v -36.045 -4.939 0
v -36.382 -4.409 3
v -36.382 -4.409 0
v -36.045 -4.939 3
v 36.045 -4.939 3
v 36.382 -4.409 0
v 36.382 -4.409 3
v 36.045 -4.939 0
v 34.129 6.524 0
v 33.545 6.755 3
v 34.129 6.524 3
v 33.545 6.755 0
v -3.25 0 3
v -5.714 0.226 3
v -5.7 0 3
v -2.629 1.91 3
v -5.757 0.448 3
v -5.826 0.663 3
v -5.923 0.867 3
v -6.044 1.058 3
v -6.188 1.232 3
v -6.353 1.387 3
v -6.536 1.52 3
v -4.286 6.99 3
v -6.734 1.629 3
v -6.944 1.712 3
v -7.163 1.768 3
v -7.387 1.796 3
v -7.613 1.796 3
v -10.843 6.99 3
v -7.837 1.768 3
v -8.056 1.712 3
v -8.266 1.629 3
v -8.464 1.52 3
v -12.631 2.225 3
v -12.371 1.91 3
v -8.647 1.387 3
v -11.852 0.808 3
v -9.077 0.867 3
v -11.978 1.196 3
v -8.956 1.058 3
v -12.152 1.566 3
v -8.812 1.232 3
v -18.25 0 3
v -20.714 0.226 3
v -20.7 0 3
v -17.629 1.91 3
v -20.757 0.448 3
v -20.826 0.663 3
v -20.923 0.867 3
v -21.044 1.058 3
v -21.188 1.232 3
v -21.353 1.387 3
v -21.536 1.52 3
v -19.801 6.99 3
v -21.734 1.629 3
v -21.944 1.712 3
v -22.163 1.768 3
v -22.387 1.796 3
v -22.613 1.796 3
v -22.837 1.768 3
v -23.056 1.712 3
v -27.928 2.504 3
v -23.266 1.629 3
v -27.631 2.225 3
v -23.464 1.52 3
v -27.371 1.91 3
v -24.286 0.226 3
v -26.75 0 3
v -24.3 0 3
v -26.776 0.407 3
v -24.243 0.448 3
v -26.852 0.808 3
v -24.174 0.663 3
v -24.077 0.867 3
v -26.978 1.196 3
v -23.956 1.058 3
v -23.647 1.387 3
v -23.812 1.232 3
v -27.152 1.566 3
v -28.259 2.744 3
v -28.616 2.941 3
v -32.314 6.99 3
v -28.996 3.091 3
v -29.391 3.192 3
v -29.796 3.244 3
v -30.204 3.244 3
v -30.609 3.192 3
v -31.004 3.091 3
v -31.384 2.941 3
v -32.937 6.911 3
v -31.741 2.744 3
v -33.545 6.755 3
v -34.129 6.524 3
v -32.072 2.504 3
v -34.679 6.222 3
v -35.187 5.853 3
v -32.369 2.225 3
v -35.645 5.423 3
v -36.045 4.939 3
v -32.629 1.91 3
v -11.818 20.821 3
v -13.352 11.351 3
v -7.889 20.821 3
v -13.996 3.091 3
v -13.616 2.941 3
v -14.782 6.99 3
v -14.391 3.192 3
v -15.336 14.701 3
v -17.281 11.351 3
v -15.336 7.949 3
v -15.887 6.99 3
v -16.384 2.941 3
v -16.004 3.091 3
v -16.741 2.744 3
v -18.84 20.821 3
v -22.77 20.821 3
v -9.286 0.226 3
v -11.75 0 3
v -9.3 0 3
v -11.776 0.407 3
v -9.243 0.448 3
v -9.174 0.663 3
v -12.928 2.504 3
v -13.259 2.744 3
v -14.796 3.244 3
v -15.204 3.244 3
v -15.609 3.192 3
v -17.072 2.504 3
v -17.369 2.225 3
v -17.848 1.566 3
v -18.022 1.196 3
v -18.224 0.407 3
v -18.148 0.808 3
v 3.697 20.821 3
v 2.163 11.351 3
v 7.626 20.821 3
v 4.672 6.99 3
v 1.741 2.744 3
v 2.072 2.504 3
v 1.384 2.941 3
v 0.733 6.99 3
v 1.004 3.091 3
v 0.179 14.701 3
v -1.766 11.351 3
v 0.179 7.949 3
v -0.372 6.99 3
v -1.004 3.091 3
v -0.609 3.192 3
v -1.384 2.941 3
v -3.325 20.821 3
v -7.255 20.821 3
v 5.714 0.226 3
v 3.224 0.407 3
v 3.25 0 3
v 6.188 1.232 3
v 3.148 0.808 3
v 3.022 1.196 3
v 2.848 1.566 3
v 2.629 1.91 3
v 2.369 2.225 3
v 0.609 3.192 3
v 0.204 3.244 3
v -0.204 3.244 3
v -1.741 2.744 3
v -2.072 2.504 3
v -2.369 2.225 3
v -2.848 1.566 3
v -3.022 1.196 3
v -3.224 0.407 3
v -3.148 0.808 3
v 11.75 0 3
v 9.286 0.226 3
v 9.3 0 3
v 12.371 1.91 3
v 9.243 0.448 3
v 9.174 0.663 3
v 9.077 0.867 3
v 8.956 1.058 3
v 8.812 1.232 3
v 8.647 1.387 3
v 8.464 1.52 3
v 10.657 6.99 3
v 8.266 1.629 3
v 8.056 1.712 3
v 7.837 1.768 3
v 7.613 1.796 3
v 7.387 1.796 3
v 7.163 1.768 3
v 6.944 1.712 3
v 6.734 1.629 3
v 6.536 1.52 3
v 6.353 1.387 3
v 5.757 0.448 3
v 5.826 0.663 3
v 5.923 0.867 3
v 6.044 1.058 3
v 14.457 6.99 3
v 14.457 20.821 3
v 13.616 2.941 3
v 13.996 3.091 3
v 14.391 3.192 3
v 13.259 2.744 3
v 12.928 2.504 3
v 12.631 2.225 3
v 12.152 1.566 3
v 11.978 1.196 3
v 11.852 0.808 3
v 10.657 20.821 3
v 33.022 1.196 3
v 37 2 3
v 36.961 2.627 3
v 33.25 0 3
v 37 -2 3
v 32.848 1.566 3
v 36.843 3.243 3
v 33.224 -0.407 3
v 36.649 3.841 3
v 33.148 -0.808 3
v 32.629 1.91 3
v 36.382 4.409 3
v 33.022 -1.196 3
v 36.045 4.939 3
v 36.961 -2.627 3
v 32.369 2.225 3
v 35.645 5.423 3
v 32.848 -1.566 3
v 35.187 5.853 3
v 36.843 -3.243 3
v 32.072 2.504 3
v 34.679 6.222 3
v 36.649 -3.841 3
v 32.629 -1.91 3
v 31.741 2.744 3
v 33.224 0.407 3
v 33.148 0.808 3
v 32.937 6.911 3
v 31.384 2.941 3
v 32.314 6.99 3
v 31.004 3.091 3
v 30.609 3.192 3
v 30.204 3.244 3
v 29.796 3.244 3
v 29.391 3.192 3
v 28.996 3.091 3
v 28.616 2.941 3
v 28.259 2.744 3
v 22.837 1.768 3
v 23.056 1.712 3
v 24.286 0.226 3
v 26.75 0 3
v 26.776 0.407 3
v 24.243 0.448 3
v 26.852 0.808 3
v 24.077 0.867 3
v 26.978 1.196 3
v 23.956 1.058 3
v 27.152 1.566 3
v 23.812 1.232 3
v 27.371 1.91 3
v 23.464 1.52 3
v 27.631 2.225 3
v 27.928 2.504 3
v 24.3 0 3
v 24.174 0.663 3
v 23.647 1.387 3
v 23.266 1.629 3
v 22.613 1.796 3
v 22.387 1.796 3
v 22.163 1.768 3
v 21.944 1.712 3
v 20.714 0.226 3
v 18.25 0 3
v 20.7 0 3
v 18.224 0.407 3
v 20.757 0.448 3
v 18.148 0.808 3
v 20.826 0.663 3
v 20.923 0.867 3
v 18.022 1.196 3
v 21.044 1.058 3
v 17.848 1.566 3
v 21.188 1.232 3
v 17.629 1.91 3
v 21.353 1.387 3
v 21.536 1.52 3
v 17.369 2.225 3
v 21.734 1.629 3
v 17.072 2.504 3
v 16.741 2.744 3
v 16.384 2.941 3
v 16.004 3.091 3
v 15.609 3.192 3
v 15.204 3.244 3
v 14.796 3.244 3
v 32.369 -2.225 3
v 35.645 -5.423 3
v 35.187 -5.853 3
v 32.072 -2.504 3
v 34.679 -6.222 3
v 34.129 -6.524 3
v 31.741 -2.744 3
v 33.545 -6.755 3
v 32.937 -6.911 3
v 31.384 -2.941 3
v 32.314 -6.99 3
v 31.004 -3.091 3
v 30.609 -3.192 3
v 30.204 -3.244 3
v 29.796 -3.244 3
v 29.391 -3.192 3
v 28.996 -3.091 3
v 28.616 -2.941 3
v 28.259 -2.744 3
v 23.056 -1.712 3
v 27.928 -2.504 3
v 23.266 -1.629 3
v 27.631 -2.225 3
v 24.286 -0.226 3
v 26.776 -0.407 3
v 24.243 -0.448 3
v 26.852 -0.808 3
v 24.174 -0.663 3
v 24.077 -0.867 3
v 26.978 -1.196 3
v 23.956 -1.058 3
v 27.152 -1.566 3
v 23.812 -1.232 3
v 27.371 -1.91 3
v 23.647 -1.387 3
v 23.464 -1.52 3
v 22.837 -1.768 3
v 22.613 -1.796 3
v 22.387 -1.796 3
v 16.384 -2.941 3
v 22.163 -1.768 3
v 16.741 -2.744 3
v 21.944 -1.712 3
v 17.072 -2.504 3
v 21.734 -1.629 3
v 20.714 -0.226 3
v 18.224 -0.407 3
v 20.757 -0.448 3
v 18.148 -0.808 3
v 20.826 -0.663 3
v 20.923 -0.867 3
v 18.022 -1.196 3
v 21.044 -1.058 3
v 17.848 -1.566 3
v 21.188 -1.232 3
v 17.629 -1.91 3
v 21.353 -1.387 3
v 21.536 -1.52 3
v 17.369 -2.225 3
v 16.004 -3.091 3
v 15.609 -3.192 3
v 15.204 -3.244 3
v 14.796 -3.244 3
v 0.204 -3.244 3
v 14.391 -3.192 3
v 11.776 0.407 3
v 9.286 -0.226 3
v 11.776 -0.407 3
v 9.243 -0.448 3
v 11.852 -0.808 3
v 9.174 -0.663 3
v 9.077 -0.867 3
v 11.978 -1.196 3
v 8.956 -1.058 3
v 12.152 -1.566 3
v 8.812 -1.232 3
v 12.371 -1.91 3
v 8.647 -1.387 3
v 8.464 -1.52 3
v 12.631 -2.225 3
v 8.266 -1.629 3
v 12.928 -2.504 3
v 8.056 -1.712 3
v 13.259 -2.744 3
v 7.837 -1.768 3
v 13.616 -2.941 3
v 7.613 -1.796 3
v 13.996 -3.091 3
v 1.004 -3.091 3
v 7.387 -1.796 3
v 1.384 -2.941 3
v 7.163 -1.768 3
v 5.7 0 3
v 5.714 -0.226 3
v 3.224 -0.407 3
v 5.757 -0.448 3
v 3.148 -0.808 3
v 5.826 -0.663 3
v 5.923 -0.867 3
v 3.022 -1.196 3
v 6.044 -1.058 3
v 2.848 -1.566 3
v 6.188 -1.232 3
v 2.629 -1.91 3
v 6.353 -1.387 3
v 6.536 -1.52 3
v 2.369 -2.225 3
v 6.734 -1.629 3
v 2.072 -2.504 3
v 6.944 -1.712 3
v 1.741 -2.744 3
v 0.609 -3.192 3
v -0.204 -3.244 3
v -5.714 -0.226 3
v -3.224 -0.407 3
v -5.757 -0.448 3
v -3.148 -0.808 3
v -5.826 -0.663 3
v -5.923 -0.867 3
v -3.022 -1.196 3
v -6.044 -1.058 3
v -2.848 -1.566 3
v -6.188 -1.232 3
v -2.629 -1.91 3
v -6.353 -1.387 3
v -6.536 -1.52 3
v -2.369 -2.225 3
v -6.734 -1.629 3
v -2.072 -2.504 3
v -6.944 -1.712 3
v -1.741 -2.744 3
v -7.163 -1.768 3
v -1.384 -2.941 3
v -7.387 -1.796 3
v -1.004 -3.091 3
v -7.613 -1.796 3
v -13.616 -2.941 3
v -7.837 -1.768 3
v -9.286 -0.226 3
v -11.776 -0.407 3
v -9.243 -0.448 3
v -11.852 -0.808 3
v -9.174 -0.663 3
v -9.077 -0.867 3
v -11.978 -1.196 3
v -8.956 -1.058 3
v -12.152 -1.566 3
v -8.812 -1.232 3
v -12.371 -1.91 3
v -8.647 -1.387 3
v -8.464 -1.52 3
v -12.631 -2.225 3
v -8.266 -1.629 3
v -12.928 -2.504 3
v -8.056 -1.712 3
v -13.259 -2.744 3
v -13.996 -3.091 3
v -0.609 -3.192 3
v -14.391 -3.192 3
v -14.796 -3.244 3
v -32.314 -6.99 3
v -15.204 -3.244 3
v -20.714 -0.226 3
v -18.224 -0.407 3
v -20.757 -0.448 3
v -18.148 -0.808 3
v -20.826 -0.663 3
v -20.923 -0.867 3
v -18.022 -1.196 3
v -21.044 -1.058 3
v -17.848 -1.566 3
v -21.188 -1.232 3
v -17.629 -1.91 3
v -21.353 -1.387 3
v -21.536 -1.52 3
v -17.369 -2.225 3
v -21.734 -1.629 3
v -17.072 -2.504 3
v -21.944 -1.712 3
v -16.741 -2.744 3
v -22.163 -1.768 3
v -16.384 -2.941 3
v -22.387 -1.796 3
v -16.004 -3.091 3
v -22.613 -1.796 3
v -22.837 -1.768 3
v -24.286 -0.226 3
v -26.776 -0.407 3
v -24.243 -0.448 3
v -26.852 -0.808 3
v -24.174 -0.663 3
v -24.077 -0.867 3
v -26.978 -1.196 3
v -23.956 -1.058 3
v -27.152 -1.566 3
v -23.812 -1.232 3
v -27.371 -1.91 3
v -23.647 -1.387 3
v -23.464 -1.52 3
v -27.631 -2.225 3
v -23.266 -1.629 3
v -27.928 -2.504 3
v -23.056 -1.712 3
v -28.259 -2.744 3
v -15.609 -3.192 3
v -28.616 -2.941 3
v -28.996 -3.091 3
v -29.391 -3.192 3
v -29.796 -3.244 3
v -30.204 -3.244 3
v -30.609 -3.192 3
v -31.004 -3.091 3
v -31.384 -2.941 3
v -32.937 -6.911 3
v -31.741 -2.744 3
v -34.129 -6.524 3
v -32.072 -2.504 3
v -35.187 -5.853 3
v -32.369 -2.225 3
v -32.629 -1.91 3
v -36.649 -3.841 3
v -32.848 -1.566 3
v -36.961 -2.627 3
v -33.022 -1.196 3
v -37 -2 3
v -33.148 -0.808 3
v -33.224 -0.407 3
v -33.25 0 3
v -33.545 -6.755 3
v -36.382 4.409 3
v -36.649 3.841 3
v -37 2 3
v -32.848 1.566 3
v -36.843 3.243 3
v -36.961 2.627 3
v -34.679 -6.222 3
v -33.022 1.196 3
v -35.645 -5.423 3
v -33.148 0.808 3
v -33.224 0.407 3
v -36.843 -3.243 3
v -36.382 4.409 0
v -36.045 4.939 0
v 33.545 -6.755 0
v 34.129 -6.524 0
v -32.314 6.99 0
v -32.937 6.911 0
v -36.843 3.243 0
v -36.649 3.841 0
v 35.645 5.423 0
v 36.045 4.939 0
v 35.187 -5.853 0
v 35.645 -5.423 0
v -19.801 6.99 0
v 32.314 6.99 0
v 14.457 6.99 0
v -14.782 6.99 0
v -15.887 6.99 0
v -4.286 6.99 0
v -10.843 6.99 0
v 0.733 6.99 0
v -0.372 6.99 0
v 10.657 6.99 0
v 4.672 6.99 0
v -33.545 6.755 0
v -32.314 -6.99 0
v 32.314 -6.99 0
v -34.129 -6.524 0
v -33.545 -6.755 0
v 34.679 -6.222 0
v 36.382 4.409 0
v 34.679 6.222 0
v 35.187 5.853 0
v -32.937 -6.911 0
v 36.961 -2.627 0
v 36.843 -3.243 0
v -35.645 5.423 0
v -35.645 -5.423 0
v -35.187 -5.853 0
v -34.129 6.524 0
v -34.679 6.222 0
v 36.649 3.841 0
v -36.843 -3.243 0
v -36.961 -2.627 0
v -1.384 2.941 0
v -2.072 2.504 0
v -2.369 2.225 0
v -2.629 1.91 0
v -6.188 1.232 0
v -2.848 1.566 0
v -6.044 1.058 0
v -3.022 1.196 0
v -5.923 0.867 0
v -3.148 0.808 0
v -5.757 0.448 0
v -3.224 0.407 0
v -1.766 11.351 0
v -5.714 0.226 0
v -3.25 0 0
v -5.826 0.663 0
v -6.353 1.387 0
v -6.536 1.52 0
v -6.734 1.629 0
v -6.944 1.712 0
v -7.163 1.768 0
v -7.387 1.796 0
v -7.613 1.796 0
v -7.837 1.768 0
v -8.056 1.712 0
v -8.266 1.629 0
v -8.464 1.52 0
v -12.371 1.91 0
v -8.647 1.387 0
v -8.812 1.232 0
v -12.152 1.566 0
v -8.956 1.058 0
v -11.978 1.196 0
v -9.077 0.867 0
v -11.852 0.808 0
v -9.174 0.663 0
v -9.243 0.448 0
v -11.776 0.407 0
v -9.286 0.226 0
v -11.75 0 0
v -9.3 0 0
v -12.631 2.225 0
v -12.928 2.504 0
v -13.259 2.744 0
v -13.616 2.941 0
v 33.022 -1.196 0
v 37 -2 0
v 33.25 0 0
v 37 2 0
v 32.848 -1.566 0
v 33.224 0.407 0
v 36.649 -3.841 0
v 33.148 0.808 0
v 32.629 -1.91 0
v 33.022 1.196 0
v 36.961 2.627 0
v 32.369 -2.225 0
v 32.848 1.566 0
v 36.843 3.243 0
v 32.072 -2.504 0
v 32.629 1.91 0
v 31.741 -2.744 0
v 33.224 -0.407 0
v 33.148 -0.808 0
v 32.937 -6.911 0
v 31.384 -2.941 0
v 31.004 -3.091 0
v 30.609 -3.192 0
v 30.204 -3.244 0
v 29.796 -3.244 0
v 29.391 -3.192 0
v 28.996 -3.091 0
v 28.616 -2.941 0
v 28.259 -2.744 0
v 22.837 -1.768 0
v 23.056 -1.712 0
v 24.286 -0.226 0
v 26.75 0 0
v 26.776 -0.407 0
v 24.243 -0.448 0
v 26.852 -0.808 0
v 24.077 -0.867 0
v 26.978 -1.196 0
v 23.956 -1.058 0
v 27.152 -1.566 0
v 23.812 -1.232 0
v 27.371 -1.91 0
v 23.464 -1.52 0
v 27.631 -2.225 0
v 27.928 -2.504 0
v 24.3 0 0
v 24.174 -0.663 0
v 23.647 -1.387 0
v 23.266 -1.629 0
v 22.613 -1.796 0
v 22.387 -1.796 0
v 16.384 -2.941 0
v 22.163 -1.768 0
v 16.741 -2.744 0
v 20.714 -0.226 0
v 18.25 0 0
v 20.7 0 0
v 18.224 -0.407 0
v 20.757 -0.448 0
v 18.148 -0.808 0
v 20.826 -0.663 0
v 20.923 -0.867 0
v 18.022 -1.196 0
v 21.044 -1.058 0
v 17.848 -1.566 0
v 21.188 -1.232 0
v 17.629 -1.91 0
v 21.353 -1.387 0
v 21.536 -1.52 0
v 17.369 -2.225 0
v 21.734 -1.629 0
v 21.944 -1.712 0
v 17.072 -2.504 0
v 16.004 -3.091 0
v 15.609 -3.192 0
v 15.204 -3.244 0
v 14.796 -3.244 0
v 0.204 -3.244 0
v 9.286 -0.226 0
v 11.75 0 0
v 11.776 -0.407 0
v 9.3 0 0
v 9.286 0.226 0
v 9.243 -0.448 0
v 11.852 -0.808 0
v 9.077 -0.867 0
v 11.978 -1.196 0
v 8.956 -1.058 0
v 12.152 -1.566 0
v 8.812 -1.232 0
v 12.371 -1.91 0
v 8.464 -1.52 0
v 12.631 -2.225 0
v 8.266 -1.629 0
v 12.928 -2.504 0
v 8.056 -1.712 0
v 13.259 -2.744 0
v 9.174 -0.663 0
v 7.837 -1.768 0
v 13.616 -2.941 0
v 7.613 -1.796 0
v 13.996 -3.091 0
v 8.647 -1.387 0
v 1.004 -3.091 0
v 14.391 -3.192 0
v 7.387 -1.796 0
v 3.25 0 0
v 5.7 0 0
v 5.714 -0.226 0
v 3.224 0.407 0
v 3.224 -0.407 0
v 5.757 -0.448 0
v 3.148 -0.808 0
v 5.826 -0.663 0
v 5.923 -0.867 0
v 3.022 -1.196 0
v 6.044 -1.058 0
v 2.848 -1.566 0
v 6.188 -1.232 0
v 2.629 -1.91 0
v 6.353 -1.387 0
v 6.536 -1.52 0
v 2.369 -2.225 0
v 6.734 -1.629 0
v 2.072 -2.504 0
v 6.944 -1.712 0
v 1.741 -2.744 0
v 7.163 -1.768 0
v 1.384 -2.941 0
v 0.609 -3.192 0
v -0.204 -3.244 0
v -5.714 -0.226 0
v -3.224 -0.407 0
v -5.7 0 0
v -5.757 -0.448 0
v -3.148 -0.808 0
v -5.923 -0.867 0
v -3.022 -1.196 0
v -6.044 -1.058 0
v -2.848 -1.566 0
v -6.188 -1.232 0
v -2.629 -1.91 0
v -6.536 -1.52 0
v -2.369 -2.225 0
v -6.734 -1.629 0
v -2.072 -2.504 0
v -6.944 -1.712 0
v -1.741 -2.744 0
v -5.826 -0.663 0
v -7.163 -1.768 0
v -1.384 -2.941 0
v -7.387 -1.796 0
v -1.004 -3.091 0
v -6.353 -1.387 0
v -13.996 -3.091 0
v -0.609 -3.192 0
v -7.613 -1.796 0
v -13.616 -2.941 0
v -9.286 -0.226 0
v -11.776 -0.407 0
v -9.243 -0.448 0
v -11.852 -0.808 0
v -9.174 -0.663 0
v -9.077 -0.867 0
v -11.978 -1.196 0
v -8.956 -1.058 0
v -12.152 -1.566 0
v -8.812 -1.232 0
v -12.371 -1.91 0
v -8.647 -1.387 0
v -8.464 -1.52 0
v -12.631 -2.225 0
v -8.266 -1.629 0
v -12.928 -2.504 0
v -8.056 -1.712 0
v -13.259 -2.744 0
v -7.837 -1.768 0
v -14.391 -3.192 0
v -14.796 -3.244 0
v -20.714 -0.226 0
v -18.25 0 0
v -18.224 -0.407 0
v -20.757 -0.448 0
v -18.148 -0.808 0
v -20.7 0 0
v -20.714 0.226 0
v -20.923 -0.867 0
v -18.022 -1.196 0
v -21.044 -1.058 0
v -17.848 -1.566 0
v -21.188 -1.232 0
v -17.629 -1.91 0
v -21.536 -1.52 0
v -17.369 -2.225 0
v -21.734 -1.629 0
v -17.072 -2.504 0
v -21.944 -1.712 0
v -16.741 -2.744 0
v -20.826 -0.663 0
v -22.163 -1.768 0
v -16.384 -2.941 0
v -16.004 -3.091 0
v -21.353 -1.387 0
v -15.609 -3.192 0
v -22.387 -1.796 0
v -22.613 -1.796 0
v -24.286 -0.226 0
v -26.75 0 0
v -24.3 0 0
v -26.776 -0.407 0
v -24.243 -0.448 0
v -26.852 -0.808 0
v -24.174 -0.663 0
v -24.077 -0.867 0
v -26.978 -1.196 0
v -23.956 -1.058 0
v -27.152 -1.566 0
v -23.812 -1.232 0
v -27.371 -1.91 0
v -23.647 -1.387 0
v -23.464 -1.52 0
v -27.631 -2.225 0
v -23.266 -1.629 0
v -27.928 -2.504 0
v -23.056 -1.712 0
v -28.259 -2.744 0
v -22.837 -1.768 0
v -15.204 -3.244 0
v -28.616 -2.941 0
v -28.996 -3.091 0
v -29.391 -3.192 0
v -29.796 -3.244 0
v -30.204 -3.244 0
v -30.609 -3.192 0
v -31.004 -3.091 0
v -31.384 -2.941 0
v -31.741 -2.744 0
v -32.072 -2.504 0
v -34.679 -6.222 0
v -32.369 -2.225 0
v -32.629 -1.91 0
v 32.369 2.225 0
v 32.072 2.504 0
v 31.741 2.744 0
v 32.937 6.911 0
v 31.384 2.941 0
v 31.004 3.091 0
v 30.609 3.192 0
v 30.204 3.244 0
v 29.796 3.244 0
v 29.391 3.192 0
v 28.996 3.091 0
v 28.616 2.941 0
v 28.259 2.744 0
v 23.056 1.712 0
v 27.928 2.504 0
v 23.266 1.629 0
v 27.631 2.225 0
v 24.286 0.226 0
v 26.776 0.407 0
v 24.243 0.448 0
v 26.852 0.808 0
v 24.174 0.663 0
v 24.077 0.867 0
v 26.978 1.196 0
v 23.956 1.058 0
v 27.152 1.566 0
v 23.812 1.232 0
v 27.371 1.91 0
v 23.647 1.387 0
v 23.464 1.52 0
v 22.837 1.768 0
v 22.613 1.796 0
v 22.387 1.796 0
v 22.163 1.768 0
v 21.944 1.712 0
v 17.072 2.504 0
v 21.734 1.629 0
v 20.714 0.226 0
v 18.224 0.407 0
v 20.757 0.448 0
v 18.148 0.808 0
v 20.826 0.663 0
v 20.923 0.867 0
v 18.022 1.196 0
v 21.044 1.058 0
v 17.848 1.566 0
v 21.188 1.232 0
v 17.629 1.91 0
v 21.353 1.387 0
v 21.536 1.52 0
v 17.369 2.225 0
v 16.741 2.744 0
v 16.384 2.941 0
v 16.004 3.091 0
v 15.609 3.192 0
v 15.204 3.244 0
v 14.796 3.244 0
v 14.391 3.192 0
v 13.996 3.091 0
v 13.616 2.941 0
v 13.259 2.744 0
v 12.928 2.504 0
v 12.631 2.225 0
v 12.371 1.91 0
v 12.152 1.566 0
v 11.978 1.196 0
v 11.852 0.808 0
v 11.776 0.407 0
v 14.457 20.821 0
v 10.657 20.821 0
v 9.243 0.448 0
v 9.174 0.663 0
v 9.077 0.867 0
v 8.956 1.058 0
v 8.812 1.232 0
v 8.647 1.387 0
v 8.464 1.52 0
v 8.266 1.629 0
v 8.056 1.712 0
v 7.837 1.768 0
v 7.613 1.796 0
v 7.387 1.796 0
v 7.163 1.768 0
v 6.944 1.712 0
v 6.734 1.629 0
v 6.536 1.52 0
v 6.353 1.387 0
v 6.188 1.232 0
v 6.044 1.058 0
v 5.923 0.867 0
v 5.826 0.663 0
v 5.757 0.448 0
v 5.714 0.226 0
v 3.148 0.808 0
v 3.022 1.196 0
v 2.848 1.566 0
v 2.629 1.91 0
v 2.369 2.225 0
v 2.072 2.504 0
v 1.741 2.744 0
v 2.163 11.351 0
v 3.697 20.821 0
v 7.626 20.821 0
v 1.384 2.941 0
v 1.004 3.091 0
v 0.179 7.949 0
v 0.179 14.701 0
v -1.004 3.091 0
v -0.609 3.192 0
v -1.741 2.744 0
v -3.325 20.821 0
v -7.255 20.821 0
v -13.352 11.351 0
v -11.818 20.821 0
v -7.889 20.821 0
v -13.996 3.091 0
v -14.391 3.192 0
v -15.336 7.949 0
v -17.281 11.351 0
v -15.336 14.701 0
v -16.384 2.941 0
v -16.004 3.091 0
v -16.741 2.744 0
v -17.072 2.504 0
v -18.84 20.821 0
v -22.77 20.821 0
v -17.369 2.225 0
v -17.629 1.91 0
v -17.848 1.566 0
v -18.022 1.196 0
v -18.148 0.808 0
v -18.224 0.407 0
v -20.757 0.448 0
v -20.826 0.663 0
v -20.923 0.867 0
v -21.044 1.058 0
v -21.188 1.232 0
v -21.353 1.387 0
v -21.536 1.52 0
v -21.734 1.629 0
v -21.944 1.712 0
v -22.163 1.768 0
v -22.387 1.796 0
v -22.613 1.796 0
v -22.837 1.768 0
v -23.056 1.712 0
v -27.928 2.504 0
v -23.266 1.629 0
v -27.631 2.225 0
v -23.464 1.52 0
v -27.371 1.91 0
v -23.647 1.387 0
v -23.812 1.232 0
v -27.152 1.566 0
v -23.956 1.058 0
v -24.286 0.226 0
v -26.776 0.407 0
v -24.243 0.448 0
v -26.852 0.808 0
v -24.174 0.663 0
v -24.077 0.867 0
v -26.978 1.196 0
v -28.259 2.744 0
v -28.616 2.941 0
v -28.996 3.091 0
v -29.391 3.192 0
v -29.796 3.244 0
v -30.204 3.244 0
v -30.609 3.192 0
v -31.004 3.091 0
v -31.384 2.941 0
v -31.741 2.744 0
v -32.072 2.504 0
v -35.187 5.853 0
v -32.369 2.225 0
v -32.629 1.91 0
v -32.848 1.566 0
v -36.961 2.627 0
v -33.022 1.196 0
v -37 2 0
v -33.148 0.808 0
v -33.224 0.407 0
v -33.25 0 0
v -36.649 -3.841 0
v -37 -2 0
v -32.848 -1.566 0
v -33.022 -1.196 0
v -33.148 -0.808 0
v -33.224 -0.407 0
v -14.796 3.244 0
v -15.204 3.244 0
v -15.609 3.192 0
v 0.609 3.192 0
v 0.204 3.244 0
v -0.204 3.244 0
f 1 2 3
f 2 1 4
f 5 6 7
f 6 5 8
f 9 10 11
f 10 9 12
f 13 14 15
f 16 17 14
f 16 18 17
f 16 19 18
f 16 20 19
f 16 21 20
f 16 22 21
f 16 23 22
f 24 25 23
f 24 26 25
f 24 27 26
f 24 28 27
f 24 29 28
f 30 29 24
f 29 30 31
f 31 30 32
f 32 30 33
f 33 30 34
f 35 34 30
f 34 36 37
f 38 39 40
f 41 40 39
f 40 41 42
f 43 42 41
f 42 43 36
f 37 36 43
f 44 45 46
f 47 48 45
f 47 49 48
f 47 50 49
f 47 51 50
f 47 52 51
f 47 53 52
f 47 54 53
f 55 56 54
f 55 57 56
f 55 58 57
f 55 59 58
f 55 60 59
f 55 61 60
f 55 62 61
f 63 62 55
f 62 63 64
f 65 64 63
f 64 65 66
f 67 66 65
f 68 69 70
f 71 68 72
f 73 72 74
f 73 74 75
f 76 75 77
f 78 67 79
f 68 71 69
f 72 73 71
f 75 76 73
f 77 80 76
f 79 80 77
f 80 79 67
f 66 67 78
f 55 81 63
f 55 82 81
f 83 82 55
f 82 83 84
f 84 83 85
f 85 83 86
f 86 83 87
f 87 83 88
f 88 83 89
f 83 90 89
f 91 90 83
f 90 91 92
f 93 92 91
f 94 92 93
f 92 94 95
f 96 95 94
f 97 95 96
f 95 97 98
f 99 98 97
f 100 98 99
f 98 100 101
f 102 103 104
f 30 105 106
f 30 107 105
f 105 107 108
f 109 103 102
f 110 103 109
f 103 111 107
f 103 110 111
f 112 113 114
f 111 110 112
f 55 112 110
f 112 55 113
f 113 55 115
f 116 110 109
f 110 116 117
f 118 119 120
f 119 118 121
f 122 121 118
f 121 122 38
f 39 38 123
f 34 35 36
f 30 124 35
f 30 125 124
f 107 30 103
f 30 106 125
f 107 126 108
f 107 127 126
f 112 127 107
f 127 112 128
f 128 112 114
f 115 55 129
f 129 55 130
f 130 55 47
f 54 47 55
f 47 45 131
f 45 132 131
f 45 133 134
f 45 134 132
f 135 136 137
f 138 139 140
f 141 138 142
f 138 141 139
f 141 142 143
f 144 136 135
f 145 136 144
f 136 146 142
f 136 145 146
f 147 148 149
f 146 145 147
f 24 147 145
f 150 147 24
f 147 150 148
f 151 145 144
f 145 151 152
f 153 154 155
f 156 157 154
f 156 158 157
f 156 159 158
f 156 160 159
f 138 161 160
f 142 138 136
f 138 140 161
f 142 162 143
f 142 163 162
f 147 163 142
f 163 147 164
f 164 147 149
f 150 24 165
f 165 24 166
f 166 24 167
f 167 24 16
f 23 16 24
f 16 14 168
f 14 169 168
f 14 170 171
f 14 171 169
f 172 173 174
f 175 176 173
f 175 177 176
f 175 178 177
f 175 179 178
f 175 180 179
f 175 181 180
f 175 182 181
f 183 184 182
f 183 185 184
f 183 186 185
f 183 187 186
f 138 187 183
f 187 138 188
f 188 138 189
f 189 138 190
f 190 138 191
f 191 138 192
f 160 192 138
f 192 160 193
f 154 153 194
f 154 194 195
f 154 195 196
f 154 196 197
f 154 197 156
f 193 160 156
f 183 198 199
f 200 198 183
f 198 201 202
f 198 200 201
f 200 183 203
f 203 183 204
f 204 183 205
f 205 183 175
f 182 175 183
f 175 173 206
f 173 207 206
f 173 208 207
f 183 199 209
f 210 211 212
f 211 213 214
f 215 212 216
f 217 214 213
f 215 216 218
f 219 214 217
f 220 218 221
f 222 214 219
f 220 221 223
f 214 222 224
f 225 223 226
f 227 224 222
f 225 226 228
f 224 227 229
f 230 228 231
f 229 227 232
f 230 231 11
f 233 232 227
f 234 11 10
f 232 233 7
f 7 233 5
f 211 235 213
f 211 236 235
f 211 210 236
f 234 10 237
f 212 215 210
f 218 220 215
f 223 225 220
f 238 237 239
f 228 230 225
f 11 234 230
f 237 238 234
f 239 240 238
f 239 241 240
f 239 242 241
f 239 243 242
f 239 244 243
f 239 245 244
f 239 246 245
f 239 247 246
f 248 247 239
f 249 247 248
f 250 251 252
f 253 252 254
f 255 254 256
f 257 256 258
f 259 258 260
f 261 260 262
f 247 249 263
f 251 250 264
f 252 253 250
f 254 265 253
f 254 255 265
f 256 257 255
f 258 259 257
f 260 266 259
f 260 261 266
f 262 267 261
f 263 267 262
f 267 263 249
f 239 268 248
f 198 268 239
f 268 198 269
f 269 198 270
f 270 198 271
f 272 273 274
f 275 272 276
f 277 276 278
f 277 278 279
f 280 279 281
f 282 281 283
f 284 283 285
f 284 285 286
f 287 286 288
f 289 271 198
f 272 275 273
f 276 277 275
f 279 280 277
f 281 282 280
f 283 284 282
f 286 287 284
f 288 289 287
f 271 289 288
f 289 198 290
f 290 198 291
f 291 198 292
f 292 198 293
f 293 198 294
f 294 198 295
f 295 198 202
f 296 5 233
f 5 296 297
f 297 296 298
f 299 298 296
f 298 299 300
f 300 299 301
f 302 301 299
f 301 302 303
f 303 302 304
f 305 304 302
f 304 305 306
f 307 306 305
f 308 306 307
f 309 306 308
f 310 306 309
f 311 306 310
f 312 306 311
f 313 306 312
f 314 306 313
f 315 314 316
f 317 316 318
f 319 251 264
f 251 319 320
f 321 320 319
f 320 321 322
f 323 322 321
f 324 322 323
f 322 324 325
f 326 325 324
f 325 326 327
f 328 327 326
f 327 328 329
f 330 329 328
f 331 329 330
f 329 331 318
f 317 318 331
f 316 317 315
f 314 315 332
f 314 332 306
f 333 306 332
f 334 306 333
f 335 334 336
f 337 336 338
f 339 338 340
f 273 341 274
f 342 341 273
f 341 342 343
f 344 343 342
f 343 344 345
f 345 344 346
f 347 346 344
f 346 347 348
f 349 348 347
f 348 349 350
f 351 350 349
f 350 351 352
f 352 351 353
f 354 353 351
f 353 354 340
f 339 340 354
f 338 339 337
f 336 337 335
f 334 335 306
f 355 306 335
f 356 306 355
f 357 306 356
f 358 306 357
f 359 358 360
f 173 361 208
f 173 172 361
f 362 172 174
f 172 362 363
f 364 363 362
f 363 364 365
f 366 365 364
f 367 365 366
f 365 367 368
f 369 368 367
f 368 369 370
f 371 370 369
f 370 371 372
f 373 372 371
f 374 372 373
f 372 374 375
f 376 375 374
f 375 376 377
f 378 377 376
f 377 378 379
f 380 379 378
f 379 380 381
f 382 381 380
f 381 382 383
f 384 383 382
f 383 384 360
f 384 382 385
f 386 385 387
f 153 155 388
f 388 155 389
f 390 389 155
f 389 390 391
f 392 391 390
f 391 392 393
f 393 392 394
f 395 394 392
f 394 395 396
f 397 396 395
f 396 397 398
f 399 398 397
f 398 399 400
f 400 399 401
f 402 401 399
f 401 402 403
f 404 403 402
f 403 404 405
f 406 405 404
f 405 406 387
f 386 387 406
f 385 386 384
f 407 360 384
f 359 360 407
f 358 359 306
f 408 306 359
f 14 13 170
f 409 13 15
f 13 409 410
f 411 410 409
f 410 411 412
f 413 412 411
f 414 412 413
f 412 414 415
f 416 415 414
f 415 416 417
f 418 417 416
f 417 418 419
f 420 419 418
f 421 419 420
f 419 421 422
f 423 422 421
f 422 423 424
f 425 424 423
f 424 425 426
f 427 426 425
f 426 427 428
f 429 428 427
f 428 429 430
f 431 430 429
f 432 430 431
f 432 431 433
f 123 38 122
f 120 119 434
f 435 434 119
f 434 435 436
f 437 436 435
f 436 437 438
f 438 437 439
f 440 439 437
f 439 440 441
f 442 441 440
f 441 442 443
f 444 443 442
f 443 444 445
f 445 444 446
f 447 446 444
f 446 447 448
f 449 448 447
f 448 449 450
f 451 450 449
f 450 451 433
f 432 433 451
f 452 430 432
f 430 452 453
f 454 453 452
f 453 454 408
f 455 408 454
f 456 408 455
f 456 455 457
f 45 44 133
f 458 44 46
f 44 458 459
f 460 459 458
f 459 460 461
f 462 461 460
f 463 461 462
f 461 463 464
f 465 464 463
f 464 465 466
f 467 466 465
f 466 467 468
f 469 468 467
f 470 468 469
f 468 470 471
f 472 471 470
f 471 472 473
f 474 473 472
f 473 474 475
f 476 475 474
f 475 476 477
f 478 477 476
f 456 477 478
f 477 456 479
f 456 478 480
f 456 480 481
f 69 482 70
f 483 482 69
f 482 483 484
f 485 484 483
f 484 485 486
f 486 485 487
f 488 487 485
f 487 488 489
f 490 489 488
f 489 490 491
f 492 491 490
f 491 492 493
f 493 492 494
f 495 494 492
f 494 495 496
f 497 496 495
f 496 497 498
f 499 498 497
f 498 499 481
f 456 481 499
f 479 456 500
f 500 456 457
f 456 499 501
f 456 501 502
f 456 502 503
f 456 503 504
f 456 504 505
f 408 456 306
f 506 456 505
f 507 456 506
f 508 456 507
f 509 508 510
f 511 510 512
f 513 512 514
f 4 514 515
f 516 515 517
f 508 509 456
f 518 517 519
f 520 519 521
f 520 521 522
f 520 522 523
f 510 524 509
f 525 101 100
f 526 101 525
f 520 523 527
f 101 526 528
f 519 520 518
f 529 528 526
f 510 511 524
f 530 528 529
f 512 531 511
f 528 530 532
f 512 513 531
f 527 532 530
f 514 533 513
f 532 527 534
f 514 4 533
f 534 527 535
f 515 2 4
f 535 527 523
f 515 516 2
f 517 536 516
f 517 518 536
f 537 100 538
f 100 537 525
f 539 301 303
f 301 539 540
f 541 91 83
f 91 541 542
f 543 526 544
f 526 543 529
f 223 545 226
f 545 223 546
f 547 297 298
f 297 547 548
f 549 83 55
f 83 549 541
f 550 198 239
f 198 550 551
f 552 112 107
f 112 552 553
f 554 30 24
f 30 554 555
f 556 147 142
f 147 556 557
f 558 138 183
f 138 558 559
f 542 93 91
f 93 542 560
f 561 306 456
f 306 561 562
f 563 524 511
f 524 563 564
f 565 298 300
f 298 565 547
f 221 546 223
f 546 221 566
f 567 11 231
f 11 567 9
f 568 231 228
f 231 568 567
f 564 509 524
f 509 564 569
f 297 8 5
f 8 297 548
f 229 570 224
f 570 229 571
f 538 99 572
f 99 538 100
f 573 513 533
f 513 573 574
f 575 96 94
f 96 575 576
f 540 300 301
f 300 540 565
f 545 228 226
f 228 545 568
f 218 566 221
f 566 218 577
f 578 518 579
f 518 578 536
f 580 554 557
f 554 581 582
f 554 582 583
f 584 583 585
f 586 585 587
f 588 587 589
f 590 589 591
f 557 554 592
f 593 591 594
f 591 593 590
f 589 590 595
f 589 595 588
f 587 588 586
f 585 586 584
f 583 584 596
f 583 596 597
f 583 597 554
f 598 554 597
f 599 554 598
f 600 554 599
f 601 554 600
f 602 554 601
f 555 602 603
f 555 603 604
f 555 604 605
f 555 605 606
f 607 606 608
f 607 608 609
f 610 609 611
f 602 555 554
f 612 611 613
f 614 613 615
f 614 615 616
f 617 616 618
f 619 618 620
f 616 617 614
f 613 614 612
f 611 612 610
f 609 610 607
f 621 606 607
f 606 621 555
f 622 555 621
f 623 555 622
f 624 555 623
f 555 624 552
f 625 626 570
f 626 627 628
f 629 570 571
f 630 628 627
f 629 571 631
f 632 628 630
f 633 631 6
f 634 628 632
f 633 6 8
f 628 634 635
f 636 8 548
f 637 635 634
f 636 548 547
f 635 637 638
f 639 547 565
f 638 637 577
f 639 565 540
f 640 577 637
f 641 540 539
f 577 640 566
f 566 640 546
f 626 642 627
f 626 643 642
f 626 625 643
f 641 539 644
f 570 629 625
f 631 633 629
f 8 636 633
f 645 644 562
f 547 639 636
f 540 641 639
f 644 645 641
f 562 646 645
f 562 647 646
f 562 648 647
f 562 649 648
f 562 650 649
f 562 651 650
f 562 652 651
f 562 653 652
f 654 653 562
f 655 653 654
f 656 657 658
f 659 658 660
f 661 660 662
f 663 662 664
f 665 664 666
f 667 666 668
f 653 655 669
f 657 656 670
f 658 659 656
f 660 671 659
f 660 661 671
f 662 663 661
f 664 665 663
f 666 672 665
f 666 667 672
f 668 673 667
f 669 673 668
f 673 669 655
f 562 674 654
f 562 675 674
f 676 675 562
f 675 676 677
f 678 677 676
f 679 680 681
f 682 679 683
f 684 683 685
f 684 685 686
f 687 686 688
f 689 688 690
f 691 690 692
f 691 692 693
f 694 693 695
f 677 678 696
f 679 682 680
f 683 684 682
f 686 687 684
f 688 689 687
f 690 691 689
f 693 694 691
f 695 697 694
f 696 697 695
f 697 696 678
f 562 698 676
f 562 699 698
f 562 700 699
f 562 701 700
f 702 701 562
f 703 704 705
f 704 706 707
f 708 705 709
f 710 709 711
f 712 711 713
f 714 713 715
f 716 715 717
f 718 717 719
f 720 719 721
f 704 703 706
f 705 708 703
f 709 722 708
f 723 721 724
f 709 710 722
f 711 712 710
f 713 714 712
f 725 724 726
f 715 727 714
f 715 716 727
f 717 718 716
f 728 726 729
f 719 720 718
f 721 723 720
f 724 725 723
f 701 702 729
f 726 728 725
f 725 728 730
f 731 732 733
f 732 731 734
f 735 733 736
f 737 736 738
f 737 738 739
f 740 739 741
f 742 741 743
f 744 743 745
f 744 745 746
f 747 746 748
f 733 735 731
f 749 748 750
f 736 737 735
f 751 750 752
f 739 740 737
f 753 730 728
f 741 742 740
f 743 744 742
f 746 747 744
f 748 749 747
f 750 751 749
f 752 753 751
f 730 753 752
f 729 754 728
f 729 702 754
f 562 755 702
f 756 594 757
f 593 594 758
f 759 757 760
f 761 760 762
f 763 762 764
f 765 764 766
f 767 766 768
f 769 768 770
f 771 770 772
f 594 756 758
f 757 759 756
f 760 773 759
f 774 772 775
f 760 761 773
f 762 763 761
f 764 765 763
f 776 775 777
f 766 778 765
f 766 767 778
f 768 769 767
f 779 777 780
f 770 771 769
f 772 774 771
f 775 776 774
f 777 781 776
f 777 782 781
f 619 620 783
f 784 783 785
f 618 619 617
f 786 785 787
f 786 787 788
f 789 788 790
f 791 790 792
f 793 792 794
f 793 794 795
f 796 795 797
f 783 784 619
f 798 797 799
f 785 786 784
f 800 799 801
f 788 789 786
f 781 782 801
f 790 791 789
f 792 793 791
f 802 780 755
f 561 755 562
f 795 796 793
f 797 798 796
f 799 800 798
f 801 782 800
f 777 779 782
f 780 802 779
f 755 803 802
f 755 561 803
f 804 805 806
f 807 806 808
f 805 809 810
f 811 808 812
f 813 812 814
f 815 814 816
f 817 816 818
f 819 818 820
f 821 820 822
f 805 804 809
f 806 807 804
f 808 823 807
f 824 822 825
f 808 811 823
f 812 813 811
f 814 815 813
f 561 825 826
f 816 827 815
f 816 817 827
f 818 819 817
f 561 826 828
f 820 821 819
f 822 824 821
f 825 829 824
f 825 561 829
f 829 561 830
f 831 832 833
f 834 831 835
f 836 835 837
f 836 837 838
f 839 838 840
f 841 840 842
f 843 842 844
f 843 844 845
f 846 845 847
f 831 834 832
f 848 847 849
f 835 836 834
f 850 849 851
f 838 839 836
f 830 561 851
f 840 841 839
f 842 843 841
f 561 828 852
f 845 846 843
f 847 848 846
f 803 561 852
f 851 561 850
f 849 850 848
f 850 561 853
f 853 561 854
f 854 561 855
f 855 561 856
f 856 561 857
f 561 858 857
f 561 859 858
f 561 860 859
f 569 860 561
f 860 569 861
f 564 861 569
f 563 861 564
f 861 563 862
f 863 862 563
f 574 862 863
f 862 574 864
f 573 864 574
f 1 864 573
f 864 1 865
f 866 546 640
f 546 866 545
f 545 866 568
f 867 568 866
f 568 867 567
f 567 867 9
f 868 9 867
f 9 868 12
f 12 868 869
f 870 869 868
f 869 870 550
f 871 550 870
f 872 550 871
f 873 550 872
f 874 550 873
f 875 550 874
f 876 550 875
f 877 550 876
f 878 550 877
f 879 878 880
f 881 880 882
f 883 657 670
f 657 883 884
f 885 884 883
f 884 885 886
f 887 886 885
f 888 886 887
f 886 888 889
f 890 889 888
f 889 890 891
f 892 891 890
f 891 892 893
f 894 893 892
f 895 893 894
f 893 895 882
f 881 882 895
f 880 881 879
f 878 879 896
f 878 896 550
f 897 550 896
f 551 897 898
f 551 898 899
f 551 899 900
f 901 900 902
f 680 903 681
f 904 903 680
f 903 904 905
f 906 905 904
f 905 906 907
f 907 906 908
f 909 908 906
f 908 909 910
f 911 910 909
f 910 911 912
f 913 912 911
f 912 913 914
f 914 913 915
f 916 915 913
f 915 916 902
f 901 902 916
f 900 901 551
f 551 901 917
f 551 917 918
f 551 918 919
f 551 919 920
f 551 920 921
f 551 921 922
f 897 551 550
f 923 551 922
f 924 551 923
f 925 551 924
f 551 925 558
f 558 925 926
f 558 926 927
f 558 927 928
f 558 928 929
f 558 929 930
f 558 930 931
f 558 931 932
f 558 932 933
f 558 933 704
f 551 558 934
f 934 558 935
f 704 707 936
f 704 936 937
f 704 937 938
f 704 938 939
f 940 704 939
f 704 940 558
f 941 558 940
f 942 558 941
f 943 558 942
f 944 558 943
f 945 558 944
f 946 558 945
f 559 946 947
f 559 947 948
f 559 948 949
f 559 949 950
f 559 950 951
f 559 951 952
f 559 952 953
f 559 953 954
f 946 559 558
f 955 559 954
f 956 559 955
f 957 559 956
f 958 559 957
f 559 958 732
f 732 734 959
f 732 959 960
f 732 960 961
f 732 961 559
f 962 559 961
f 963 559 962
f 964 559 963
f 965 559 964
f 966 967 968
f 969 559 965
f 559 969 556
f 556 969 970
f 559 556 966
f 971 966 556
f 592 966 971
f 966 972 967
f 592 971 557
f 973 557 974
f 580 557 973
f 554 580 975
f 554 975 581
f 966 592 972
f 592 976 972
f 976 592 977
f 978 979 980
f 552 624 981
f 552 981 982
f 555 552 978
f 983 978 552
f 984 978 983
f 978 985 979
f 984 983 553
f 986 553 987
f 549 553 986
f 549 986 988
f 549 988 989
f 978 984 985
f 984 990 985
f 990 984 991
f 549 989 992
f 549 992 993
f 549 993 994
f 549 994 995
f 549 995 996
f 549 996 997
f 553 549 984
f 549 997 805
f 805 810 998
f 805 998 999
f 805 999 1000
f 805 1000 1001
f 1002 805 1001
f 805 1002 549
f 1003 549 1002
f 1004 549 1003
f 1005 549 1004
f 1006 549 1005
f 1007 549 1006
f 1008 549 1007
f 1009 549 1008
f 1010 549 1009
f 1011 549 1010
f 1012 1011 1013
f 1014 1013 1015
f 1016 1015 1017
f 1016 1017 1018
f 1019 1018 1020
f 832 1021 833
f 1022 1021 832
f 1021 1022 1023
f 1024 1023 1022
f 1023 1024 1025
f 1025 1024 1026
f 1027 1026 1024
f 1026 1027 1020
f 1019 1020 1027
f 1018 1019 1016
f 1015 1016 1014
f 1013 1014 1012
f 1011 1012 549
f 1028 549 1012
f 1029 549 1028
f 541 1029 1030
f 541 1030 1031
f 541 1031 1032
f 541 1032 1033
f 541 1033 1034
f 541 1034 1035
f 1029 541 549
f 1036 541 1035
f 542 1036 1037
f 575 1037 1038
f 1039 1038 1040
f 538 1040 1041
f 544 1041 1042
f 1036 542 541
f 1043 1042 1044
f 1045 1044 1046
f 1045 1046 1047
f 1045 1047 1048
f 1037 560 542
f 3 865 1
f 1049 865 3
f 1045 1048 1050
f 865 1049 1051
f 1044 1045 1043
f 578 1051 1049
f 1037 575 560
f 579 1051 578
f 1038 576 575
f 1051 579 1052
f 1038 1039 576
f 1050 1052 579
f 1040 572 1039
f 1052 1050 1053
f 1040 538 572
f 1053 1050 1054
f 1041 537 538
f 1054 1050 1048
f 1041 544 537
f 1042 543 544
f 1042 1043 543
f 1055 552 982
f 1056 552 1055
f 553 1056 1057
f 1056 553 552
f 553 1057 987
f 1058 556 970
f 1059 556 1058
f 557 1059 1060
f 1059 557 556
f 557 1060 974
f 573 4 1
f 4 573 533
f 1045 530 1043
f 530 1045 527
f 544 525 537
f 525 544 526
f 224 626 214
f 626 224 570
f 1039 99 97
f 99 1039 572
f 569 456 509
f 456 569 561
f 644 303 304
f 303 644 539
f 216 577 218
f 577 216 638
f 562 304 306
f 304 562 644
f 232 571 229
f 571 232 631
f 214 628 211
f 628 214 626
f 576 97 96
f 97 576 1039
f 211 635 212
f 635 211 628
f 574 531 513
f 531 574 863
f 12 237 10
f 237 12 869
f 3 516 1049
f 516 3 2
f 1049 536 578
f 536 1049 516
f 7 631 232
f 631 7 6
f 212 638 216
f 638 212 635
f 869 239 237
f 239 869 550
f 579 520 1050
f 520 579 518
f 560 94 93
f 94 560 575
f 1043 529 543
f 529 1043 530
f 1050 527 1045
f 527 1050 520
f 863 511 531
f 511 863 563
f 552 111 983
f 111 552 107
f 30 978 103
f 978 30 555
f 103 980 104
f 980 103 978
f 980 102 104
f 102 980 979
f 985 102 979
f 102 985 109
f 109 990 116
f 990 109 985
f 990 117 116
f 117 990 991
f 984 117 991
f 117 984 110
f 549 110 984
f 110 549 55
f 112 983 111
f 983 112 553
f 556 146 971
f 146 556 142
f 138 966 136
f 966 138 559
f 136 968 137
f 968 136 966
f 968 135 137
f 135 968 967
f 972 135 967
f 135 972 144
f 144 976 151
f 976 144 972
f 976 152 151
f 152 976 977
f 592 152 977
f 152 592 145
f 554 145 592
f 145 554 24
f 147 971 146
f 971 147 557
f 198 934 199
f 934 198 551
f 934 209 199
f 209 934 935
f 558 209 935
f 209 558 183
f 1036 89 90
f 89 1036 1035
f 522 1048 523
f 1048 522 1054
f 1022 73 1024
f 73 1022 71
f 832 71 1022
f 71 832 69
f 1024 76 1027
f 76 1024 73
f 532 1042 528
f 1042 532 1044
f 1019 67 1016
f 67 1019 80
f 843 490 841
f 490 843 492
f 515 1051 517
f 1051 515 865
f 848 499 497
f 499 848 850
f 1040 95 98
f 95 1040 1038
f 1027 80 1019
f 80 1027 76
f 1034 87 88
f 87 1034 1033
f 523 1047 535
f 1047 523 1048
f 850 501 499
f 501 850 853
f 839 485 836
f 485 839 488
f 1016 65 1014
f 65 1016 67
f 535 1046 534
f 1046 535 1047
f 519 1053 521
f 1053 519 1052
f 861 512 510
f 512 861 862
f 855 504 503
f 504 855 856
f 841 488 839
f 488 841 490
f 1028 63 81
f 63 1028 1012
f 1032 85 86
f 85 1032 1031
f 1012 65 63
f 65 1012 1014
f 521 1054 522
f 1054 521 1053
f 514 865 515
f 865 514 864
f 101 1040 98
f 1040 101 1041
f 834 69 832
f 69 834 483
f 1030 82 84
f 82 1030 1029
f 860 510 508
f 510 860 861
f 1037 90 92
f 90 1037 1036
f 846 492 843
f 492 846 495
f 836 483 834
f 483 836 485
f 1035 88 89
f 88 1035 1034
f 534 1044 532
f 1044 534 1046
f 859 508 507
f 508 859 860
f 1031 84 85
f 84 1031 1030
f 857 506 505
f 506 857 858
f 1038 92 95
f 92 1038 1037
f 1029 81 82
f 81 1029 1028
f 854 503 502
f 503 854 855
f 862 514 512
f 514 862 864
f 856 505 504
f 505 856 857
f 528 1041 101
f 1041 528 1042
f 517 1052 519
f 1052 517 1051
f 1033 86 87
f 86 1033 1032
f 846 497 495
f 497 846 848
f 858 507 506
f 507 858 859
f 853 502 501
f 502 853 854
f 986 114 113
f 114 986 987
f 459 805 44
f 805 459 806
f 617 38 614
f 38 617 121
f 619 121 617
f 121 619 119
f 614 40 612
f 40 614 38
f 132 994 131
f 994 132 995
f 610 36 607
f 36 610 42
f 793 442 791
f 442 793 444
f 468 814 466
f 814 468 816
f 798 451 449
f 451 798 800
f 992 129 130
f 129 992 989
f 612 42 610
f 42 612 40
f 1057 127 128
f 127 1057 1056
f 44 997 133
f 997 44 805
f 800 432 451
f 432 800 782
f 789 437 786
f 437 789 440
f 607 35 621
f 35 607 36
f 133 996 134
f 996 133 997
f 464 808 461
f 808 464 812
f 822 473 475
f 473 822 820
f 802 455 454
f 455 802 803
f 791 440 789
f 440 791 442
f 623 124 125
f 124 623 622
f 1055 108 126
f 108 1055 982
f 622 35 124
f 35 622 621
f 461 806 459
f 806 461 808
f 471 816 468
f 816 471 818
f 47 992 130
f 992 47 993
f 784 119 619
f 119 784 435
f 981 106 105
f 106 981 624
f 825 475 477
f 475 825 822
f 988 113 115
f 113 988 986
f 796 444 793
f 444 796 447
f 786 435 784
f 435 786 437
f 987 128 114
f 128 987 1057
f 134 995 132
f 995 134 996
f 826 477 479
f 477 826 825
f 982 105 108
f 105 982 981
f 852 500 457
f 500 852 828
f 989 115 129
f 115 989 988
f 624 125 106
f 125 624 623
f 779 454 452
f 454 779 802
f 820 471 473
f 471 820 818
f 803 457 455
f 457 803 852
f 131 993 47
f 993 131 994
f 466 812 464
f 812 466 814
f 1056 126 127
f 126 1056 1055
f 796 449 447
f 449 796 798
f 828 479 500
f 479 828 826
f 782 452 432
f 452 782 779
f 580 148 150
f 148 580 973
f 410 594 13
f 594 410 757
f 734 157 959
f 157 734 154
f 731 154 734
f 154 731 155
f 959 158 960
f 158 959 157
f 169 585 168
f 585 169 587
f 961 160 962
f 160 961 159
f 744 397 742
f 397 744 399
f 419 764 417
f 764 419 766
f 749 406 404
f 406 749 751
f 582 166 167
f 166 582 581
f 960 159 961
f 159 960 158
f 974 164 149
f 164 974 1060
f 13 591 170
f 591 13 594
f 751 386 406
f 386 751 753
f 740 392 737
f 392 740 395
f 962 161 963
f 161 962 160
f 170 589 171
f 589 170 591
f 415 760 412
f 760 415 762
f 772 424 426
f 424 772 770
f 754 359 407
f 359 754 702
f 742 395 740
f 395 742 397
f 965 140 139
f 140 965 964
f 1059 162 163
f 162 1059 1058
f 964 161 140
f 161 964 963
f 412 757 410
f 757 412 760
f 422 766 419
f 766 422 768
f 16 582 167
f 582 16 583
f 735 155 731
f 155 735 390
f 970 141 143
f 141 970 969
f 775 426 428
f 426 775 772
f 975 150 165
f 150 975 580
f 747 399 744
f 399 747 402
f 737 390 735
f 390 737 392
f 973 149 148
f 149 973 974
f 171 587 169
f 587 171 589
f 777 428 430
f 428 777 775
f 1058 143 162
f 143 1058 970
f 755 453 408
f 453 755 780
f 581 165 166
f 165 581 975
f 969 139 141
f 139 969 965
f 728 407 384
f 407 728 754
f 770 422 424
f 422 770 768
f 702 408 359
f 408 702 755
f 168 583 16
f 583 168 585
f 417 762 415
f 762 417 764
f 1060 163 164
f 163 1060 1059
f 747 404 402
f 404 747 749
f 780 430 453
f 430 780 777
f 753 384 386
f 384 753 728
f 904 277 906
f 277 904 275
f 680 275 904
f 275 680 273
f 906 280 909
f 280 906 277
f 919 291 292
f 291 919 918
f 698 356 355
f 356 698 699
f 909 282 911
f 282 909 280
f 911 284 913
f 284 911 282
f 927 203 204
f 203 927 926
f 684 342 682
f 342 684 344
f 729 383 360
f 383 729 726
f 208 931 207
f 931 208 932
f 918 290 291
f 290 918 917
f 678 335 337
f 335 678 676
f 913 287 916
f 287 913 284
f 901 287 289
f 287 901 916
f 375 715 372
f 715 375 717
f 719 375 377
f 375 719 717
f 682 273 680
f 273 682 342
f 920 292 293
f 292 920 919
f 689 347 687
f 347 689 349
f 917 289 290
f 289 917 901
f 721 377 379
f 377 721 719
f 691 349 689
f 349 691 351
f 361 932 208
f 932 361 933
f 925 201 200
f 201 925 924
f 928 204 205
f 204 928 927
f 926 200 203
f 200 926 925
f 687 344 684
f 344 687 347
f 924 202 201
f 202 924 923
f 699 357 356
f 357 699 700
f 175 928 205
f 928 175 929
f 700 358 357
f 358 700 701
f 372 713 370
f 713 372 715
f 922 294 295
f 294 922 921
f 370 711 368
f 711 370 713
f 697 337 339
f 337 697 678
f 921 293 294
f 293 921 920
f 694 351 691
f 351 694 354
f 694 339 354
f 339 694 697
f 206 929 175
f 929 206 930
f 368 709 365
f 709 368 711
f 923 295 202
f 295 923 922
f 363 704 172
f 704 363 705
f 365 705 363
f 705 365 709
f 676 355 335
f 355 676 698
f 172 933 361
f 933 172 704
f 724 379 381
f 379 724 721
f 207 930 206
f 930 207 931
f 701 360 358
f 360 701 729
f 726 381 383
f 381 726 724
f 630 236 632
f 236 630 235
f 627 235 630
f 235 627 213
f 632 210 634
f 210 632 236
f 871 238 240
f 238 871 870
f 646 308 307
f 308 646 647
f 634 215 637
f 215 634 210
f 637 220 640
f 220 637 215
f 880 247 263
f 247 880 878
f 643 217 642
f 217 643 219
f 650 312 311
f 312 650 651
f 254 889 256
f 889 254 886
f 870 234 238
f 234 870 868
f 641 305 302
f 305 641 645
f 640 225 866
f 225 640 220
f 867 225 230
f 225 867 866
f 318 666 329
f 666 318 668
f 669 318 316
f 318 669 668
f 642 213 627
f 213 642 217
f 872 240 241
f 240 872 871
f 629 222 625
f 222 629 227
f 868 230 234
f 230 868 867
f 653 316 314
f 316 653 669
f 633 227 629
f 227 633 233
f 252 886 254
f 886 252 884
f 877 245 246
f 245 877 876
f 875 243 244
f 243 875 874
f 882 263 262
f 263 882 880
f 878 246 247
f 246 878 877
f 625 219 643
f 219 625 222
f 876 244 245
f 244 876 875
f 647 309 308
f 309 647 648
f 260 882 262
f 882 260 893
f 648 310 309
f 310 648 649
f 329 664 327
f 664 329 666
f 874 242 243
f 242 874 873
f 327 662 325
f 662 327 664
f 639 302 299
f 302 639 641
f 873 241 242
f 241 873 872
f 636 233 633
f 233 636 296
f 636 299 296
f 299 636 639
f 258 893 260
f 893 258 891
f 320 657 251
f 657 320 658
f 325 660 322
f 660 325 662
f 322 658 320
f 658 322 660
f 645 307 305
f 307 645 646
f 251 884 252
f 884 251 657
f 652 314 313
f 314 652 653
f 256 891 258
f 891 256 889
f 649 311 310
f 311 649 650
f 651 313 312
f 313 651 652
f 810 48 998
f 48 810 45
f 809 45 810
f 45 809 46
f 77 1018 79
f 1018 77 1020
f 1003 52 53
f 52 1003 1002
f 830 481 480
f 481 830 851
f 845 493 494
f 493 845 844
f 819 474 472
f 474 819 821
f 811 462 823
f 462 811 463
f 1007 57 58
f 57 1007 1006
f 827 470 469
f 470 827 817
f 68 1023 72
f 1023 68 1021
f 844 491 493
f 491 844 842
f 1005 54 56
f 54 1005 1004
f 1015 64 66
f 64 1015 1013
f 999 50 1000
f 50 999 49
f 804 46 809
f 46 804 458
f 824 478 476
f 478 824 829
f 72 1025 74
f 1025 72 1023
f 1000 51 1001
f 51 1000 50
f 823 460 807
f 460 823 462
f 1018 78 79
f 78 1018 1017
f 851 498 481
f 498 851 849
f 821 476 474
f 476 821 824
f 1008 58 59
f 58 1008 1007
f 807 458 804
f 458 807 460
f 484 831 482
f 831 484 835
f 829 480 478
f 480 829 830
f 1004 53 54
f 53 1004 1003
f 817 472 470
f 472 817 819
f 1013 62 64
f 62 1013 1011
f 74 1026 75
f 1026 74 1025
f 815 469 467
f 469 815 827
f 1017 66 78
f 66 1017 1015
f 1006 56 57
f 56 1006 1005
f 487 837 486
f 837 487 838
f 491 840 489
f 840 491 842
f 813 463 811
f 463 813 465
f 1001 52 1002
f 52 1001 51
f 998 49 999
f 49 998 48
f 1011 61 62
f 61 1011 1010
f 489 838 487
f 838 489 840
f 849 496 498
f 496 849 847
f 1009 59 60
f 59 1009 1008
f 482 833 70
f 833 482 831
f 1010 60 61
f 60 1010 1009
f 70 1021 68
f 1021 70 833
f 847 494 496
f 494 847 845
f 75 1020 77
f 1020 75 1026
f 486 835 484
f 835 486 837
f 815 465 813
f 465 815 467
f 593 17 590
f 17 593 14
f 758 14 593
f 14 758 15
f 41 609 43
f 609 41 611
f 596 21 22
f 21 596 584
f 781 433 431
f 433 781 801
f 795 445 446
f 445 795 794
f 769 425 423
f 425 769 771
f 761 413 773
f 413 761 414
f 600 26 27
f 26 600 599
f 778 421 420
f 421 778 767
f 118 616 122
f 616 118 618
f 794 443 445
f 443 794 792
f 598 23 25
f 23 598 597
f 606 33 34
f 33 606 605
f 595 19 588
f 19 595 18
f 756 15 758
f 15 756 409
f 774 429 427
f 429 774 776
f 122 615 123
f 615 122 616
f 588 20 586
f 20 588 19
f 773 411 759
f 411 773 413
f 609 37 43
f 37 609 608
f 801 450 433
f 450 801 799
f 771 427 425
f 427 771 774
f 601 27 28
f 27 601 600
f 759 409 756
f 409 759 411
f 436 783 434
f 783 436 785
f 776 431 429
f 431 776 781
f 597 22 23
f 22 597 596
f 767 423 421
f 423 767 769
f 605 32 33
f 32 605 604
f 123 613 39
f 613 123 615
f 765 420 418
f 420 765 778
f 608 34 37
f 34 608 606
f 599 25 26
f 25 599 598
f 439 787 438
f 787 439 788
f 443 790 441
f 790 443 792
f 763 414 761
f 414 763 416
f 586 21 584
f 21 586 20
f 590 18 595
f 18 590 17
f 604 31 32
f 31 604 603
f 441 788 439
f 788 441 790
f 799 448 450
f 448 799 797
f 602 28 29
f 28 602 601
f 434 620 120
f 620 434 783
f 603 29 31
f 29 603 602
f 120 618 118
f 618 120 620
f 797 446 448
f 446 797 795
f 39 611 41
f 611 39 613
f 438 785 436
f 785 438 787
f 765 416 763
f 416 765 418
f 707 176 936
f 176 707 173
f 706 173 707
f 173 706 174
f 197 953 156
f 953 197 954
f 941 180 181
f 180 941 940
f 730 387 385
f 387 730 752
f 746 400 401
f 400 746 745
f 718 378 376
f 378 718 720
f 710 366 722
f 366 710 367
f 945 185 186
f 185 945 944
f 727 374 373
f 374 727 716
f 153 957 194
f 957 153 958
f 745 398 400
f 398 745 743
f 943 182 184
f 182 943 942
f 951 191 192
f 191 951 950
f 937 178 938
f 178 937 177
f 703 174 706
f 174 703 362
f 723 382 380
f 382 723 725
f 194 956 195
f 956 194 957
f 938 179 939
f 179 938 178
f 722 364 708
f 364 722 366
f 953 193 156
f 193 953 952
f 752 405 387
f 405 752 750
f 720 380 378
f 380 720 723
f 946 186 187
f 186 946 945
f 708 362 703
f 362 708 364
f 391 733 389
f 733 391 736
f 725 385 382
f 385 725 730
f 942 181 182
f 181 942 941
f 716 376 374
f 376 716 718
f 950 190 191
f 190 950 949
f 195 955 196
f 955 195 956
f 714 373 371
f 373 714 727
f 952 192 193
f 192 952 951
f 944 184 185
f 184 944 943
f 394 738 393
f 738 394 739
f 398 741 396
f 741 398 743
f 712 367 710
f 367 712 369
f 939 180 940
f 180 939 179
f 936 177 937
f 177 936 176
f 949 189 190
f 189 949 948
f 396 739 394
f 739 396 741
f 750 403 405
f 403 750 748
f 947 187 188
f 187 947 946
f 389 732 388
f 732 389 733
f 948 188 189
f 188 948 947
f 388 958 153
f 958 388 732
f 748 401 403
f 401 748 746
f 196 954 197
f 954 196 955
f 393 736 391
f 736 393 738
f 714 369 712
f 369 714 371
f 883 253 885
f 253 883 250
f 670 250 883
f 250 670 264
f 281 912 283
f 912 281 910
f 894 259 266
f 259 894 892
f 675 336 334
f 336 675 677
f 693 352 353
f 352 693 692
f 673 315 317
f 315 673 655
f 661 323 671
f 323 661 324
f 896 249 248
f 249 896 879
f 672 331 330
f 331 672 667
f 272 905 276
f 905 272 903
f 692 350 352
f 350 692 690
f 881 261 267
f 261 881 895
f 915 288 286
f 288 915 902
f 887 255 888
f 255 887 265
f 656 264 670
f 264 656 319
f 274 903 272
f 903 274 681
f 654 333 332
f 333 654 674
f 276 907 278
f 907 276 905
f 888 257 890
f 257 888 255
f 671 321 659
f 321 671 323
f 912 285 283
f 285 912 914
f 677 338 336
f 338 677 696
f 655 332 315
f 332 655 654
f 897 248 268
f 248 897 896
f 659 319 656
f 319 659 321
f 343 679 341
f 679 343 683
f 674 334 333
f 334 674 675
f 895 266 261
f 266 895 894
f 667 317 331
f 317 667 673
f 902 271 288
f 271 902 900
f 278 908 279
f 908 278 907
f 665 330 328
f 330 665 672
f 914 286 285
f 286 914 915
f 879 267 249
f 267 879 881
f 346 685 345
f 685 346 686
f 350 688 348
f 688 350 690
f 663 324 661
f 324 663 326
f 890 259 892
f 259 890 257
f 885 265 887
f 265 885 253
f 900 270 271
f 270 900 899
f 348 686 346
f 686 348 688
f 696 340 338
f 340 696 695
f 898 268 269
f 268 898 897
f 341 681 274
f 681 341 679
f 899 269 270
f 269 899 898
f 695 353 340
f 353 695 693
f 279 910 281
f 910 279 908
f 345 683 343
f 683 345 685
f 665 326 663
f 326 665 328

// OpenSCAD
$fn = 50;


difference() {
	union() {
		hull() {
			translate(v = [-32.0000000000, 2.0000000000, 0]) {
				cylinder(h = 3, r = 5);
			}
			translate(v = [32.0000000000, 2.0000000000, 0]) {
				cylinder(h = 3, r = 5);
			}
			translate(v = [-32.0000000000, -2.0000000000, 0]) {
				cylinder(h = 3, r = 5);
			}
			translate(v = [32.0000000000, -2.0000000000, 0]) {
				cylinder(h = 3, r = 5);
			}
		}
		translate(v = [0, 20.3703703704, 0]) {
			linear_extrude(height = 3) {
				text(font = "DejaVu Sans Mono:style=Bold", halign = "center", size = 19.0000000000, text = "XXL", valign = "top");
			}
		}
	}
	union() {
		translate(v = [-30.0000000000, 0.0000000000, 0]) {
			translate(v = [0, 0, -100]) {
				cylinder(h = 200, r = 3.2500000000);
			}
		}
		translate(v = [-15.0000000000, 0.0000000000, 0]) {
			translate(v = [0, 0, -100]) {
				cylinder(h = 200, r = 3.2500000000);
			}
		}
		translate(v = [0, 0, -100]) {
			cylinder(h = 200, r = 3.2500000000);
		}
		translate(v = [15.0000000000, 0.0000000000, 0]) {
			translate(v = [0, 0, -100]) {
				cylinder(h = 200, r = 3.2500000000);
			}
		}
		translate(v = [30.0000000000, 0.0000000000, 0]) {
			translate(v = [0, 0, -100]) {
				cylinder(h = 200, r = 3.2500000000);
			}
		}
		translate(v = [-30.0000000000, 0.0000000000, 0]) {
			translate(v = [0, 0, -100]) {
				cylinder(h = 200, r = 1.8000000000);
			}
		}
		translate(v = [-22.5000000000, 0.0000000000, 0]) {
			translate(v = [0, 0, -100]) {
				cylinder(h = 200, r = 1.8000000000);
			}
		}
		translate(v = [-15.0000000000, 0.0000000000, 0]) {
			translate(v = [0, 0, -100]) {
				cylinder(h = 200, r = 1.8000000000);
			}
		}
		translate(v = [-7.5000000000, 0.0000000000, 0]) {
			translate(v = [0, 0, -100]) {
				cylinder(h = 200, r = 1.8000000000);
			}
		}
		translate(v = [0, 0, -100]) {
			cylinder(h = 200, r = 1.8000000000);
		}
		translate(v = [7.5000000000, 0.0000000000, 0]) {
			translate(v = [0, 0, -100]) {
				cylinder(h = 200, r = 1.8000000000);
			}
		}
		translate(v = [15.0000000000, 0.0000000000, 0]) {
			translate(v = [0, 0, -100]) {
				cylinder(h = 200, r = 1.8000000000);
			}
		}
		translate(v = [22.5000000000, 0.0000000000, 0]) {
			translate(v = [0, 0, -100]) {
				cylinder(h = 200, r = 1.8000000000);
			}
		}
		translate(v = [30.0000000000, 0.0000000000, 0]) {
			translate(v = [0, 0, -100]) {
				cylinder(h = 200, r = 1.8000000000);
			}
		}
	}
}
